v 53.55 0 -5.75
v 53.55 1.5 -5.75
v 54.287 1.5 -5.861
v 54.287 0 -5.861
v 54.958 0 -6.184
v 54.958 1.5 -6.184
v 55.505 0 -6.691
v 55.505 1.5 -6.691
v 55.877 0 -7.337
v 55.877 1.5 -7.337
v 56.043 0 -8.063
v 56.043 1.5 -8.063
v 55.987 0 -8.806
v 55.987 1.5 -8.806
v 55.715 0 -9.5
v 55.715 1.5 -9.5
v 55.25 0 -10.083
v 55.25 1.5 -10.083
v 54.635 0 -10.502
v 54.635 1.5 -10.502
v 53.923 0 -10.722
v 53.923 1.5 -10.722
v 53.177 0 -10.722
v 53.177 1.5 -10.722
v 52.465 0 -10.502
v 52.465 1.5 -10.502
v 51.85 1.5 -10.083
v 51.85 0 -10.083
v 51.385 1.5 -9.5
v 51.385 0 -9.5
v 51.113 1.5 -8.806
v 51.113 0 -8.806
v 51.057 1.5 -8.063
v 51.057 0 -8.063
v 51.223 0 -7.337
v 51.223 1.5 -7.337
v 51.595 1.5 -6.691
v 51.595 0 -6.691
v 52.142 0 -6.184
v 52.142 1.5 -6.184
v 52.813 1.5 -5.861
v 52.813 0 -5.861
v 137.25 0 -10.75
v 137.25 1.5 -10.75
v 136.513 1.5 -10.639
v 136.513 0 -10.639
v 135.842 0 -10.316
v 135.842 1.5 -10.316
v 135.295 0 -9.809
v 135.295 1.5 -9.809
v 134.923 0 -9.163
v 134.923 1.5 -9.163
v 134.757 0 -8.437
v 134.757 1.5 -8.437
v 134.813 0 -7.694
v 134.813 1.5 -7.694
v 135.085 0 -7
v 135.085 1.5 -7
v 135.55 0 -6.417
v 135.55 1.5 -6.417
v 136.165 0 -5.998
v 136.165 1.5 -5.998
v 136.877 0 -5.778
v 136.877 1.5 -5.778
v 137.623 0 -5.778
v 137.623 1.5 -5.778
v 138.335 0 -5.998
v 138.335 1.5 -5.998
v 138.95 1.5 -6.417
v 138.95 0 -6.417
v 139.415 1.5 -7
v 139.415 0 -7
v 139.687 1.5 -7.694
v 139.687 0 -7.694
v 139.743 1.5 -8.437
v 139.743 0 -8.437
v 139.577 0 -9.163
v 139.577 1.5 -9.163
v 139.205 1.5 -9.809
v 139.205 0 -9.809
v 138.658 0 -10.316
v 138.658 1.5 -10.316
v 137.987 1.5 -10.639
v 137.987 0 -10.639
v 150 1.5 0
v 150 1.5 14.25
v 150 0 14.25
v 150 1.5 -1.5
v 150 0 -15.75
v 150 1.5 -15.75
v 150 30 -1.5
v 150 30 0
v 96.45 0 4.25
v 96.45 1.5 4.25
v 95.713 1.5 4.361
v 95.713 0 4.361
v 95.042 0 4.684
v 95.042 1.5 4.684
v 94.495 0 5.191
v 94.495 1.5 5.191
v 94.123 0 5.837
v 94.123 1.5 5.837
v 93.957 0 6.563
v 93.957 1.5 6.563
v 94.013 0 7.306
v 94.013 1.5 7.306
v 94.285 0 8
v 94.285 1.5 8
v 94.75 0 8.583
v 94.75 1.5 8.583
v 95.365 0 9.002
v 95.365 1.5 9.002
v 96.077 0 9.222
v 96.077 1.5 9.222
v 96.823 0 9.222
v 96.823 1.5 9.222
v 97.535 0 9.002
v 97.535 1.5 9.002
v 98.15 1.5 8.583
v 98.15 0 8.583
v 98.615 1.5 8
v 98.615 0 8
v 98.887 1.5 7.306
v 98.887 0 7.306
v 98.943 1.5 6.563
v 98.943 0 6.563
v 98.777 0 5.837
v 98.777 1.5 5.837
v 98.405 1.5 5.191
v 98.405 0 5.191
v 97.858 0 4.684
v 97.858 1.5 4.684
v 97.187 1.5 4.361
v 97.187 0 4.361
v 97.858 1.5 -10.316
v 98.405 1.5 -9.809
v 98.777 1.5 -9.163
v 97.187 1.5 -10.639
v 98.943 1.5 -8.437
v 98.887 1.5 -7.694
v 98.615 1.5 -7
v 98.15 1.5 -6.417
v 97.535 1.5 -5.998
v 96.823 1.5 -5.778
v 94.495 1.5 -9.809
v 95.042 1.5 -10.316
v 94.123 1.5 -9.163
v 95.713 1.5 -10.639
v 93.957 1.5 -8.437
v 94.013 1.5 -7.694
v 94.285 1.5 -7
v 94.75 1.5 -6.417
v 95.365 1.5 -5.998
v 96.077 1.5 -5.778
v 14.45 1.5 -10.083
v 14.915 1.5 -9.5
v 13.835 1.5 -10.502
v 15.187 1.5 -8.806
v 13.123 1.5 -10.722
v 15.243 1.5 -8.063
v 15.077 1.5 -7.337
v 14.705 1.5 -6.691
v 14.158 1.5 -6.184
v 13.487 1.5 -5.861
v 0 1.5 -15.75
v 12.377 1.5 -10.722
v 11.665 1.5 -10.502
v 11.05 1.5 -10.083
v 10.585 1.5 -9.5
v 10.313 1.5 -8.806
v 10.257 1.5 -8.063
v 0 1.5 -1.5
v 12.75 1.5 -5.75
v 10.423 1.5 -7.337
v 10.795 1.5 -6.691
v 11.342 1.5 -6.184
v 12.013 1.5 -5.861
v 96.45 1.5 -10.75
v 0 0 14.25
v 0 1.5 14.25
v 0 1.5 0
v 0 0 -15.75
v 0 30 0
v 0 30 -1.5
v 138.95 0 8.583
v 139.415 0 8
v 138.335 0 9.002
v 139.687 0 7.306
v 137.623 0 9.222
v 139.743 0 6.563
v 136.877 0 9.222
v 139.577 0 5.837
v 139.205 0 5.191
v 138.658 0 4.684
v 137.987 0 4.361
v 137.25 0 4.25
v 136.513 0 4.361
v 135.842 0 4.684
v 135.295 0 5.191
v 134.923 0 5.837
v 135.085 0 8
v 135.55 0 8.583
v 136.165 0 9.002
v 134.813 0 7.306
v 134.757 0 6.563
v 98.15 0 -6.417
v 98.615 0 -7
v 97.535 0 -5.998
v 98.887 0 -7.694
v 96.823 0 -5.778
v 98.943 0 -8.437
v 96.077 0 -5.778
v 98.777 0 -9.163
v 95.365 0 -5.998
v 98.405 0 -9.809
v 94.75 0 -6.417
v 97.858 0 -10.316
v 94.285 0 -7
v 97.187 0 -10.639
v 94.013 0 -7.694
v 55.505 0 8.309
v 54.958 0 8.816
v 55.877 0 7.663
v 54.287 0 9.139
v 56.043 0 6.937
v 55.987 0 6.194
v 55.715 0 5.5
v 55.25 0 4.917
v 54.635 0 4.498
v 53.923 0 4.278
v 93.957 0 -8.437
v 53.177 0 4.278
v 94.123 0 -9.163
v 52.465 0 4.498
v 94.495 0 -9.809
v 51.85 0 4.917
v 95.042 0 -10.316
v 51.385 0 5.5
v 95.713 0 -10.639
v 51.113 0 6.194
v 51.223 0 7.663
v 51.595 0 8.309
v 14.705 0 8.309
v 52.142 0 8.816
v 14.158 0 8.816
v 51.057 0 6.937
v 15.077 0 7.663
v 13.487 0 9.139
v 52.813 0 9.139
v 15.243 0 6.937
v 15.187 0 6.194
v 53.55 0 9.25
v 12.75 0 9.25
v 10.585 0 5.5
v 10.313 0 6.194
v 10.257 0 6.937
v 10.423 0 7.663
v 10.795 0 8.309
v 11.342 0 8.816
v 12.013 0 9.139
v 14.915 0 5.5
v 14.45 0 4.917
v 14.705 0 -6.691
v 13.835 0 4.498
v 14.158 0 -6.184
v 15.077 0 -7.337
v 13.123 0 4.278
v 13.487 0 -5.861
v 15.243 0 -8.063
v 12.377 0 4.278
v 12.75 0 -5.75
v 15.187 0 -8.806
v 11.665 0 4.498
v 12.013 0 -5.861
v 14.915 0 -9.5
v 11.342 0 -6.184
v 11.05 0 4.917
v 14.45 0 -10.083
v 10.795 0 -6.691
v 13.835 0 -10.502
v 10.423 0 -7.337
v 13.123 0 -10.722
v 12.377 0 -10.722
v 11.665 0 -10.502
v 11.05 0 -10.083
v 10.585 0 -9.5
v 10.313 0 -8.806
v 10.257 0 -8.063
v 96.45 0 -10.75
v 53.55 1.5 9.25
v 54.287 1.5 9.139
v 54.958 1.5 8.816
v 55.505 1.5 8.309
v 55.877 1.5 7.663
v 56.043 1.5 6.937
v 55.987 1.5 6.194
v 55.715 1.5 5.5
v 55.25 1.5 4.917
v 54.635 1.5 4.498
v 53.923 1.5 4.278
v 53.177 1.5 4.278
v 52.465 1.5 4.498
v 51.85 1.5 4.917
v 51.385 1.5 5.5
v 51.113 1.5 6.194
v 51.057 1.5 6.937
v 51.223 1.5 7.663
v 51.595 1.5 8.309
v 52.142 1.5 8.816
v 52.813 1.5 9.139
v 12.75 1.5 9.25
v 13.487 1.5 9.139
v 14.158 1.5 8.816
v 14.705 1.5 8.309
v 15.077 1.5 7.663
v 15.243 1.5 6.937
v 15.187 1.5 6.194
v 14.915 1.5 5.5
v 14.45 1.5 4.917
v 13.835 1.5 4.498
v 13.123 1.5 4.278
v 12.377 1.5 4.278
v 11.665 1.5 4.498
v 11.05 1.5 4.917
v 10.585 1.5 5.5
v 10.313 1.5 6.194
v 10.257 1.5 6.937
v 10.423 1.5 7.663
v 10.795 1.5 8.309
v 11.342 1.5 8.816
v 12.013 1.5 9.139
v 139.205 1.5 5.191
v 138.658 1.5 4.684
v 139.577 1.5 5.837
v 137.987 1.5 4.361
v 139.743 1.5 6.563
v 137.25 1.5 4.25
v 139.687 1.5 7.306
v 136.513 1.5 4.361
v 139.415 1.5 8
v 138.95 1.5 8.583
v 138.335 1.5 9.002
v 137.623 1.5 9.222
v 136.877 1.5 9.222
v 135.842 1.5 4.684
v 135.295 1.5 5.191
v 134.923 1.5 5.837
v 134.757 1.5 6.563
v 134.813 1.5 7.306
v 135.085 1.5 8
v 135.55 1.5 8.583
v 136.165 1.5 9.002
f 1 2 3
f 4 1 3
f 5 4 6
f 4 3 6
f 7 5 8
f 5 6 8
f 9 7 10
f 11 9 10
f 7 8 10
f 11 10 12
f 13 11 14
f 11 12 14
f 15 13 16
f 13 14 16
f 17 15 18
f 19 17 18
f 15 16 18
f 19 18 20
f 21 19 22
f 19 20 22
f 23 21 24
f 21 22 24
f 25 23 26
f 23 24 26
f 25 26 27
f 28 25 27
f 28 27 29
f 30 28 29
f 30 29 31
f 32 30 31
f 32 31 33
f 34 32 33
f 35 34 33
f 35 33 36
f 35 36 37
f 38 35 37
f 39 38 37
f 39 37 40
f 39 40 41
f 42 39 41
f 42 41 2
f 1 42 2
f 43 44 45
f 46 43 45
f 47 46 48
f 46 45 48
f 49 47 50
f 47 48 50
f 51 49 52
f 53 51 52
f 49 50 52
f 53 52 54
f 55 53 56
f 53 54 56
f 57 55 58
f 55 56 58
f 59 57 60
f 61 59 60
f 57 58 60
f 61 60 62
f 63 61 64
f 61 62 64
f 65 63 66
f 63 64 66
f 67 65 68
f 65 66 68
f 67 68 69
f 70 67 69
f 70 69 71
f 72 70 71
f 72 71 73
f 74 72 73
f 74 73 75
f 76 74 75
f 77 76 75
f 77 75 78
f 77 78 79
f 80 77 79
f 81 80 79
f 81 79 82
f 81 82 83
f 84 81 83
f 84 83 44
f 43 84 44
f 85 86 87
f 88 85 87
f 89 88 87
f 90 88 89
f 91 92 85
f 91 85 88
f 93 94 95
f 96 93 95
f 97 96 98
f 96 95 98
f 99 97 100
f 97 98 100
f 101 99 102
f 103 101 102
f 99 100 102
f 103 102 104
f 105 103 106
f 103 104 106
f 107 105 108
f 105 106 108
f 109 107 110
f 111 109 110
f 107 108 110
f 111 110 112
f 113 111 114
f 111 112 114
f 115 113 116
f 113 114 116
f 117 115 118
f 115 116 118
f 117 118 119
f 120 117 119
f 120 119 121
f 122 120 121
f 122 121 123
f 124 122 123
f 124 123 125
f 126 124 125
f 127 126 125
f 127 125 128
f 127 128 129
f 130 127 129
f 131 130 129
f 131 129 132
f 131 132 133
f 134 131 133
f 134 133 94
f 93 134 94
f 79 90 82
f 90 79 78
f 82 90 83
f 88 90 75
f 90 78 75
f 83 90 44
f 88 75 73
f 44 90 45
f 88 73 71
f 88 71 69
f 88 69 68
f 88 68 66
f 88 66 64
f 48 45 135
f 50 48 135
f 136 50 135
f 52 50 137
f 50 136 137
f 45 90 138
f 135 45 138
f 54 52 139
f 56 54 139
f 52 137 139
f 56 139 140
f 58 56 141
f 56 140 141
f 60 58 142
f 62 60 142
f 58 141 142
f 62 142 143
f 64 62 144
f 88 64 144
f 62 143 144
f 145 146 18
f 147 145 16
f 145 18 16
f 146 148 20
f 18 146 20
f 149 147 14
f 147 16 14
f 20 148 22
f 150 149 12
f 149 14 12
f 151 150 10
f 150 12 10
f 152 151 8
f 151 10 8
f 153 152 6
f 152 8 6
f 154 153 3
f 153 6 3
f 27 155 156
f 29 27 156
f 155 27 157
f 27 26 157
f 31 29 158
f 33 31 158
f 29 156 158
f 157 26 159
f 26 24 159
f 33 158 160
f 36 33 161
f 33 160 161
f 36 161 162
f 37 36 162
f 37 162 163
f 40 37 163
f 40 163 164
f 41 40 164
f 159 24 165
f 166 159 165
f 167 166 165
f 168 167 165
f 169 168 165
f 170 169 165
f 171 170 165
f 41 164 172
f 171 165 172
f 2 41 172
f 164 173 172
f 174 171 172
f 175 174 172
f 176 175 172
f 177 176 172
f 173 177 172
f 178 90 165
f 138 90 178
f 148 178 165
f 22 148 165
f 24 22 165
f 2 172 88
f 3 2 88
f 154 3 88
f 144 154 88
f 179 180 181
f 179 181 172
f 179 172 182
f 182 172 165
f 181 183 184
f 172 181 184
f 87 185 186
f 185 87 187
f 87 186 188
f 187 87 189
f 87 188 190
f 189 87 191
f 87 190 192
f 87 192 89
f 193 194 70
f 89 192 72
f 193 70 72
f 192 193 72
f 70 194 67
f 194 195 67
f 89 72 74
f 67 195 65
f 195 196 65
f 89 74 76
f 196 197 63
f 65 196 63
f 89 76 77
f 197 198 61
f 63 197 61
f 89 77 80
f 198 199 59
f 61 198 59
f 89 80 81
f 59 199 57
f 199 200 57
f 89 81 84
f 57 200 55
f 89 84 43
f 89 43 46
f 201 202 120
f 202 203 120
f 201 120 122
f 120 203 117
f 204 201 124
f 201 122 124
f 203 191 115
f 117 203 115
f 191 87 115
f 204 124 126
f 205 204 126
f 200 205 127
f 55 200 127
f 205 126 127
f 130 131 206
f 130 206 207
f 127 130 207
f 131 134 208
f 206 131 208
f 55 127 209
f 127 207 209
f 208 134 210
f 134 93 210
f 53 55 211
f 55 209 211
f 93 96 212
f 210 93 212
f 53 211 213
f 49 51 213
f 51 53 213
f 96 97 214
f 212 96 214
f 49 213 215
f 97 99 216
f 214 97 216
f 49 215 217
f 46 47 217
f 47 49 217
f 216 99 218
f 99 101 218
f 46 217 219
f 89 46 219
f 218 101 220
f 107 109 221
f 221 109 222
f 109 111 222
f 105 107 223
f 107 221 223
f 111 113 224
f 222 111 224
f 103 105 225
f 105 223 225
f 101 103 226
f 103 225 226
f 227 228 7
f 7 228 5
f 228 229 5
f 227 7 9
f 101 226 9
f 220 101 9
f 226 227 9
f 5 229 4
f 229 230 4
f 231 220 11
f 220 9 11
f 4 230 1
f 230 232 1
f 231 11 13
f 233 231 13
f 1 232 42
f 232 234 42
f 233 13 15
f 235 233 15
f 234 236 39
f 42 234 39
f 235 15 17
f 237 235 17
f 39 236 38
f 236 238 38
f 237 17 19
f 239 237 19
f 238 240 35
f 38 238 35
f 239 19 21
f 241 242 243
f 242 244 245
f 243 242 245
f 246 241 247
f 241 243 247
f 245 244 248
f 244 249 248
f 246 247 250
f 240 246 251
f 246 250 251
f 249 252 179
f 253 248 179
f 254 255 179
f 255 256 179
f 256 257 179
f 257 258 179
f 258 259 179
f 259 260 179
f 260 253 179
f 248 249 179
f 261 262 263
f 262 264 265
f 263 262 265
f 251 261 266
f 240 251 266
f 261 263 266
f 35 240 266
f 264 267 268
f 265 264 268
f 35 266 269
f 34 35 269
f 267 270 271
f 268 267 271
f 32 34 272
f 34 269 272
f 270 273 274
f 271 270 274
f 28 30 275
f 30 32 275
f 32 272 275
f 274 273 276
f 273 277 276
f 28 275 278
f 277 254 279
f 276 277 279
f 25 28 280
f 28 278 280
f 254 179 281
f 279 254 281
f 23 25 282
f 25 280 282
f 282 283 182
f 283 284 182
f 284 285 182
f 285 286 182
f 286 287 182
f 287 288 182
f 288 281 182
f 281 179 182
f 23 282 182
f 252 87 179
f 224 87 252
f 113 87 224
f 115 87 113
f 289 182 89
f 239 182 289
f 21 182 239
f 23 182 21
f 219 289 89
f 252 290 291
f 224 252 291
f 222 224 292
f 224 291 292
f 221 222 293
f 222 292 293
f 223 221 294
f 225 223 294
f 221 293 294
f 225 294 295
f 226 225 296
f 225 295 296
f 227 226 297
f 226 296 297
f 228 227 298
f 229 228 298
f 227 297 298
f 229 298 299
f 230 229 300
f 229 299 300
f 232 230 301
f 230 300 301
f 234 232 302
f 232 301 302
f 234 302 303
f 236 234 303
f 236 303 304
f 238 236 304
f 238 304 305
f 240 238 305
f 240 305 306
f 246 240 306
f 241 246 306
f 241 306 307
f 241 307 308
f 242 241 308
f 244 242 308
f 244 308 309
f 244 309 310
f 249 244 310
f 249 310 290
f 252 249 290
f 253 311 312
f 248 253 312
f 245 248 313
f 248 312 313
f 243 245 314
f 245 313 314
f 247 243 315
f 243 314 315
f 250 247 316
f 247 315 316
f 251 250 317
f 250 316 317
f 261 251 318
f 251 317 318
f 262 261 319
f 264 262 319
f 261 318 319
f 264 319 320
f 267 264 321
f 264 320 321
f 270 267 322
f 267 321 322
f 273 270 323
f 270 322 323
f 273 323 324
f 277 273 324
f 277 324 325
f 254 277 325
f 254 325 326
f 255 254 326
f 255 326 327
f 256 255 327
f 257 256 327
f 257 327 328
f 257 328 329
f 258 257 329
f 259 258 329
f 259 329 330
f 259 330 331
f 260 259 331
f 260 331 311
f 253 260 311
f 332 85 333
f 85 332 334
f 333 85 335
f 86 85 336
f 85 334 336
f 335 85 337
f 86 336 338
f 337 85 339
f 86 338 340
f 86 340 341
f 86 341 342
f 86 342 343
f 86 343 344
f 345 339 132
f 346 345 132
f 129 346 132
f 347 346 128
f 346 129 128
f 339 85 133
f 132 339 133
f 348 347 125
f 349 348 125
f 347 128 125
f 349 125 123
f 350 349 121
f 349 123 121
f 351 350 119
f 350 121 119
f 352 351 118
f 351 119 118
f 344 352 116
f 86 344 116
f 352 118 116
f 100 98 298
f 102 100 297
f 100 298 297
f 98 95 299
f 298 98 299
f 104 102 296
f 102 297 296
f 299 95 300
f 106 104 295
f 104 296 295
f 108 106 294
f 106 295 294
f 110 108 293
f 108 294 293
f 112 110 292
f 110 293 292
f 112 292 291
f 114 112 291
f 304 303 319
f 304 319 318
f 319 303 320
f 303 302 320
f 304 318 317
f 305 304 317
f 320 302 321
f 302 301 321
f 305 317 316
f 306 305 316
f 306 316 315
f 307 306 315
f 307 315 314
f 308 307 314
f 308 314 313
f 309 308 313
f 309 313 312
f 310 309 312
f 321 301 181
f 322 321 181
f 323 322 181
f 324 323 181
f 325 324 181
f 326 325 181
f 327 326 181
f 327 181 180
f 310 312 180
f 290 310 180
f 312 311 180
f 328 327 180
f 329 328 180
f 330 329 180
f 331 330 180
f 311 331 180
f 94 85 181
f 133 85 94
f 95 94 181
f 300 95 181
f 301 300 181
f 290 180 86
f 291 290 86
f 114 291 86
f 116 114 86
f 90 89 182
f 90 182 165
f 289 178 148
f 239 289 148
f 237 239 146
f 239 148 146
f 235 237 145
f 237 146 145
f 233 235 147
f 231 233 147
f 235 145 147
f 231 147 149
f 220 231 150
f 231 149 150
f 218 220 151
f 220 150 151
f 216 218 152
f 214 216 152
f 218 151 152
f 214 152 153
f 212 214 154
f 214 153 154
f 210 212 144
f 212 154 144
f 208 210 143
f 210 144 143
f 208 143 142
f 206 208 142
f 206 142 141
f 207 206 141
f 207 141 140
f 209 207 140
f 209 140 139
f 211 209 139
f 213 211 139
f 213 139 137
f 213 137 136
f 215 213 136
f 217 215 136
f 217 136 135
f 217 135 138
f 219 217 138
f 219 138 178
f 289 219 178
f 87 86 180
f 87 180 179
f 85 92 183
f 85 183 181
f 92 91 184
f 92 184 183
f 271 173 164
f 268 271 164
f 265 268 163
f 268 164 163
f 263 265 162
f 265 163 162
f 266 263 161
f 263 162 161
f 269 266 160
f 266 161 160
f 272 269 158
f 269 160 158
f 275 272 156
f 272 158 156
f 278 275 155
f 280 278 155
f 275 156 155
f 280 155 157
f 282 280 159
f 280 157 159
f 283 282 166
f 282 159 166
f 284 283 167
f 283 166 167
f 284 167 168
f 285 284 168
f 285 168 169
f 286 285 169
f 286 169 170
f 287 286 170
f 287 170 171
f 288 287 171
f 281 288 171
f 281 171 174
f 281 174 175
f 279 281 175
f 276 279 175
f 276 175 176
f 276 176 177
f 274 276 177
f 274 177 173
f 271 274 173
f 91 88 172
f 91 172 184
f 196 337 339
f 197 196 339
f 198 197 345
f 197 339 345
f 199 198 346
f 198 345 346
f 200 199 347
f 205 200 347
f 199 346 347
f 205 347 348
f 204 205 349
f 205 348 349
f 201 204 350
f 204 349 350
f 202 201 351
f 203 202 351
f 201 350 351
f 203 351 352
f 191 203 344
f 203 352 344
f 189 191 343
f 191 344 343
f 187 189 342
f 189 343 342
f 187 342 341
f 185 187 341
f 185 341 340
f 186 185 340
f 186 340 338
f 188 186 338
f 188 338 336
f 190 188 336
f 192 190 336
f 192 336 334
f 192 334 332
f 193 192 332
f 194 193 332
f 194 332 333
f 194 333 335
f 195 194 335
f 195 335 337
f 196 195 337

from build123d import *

# Parameters (mm, degrees)
BOSS_EXTRUDE1_DEPTH = 150
SKETCH2_R           = 2.5
CUT_EXTRUDE1_DEPTH  = 154.493688795


with BuildPart() as part:
    # Sketch1 → Boss-Extrude1 (new body)
    with BuildSketch(Plane(origin=(0, 0, 0), x_dir=(0, 0, -1), z_dir=(1, 0, 0))):
        Polygon((-14.25, 0), (15.75, 0), (15.75, 1.5), (1.5, 1.5), (1.5, 30), (0, 30), (0, 1.5), (-14.25, 1.5), align=None)
    extrude(amount=BOSS_EXTRUDE1_DEPTH)

    # Sketch2 → Cut-Extrude1 (cut, through all)
    with BuildSketch(Plane(origin=(0, 1.5, 0), x_dir=(1, 0, 0), z_dir=(0, 1, 0))):
        with Locations(Location((12.75, -6.75, 0), (0, 0, 270))):
            Circle(SKETCH2_R)
        with Locations(Location((12.75, 8.25, 0), (0, 0, 270))):
            Circle(SKETCH2_R)
        with Locations(Location((53.55, 8.25, 0), (0, 0, 270))):
            Circle(SKETCH2_R)
        with Locations(Location((53.55, -6.75, 0), (0, 0, 270))):
            Circle(SKETCH2_R)
        with Locations(Location((96.45, -6.75, 0), (0, 0, 90))):
            Circle(SKETCH2_R)
        with Locations(Location((96.45, 8.25, 0), (0, 0, 90))):
            Circle(SKETCH2_R)
        with Locations(Location((137.25, 8.25, 0), (0, 0, 90))):
            Circle(SKETCH2_R)
        with Locations(Location((137.25, -6.75, 0), (0, 0, 90))):
            Circle(SKETCH2_R)
    extrude(amount=-CUT_EXTRUDE1_DEPTH, mode=Mode.SUBTRACT)


solid = part.part
